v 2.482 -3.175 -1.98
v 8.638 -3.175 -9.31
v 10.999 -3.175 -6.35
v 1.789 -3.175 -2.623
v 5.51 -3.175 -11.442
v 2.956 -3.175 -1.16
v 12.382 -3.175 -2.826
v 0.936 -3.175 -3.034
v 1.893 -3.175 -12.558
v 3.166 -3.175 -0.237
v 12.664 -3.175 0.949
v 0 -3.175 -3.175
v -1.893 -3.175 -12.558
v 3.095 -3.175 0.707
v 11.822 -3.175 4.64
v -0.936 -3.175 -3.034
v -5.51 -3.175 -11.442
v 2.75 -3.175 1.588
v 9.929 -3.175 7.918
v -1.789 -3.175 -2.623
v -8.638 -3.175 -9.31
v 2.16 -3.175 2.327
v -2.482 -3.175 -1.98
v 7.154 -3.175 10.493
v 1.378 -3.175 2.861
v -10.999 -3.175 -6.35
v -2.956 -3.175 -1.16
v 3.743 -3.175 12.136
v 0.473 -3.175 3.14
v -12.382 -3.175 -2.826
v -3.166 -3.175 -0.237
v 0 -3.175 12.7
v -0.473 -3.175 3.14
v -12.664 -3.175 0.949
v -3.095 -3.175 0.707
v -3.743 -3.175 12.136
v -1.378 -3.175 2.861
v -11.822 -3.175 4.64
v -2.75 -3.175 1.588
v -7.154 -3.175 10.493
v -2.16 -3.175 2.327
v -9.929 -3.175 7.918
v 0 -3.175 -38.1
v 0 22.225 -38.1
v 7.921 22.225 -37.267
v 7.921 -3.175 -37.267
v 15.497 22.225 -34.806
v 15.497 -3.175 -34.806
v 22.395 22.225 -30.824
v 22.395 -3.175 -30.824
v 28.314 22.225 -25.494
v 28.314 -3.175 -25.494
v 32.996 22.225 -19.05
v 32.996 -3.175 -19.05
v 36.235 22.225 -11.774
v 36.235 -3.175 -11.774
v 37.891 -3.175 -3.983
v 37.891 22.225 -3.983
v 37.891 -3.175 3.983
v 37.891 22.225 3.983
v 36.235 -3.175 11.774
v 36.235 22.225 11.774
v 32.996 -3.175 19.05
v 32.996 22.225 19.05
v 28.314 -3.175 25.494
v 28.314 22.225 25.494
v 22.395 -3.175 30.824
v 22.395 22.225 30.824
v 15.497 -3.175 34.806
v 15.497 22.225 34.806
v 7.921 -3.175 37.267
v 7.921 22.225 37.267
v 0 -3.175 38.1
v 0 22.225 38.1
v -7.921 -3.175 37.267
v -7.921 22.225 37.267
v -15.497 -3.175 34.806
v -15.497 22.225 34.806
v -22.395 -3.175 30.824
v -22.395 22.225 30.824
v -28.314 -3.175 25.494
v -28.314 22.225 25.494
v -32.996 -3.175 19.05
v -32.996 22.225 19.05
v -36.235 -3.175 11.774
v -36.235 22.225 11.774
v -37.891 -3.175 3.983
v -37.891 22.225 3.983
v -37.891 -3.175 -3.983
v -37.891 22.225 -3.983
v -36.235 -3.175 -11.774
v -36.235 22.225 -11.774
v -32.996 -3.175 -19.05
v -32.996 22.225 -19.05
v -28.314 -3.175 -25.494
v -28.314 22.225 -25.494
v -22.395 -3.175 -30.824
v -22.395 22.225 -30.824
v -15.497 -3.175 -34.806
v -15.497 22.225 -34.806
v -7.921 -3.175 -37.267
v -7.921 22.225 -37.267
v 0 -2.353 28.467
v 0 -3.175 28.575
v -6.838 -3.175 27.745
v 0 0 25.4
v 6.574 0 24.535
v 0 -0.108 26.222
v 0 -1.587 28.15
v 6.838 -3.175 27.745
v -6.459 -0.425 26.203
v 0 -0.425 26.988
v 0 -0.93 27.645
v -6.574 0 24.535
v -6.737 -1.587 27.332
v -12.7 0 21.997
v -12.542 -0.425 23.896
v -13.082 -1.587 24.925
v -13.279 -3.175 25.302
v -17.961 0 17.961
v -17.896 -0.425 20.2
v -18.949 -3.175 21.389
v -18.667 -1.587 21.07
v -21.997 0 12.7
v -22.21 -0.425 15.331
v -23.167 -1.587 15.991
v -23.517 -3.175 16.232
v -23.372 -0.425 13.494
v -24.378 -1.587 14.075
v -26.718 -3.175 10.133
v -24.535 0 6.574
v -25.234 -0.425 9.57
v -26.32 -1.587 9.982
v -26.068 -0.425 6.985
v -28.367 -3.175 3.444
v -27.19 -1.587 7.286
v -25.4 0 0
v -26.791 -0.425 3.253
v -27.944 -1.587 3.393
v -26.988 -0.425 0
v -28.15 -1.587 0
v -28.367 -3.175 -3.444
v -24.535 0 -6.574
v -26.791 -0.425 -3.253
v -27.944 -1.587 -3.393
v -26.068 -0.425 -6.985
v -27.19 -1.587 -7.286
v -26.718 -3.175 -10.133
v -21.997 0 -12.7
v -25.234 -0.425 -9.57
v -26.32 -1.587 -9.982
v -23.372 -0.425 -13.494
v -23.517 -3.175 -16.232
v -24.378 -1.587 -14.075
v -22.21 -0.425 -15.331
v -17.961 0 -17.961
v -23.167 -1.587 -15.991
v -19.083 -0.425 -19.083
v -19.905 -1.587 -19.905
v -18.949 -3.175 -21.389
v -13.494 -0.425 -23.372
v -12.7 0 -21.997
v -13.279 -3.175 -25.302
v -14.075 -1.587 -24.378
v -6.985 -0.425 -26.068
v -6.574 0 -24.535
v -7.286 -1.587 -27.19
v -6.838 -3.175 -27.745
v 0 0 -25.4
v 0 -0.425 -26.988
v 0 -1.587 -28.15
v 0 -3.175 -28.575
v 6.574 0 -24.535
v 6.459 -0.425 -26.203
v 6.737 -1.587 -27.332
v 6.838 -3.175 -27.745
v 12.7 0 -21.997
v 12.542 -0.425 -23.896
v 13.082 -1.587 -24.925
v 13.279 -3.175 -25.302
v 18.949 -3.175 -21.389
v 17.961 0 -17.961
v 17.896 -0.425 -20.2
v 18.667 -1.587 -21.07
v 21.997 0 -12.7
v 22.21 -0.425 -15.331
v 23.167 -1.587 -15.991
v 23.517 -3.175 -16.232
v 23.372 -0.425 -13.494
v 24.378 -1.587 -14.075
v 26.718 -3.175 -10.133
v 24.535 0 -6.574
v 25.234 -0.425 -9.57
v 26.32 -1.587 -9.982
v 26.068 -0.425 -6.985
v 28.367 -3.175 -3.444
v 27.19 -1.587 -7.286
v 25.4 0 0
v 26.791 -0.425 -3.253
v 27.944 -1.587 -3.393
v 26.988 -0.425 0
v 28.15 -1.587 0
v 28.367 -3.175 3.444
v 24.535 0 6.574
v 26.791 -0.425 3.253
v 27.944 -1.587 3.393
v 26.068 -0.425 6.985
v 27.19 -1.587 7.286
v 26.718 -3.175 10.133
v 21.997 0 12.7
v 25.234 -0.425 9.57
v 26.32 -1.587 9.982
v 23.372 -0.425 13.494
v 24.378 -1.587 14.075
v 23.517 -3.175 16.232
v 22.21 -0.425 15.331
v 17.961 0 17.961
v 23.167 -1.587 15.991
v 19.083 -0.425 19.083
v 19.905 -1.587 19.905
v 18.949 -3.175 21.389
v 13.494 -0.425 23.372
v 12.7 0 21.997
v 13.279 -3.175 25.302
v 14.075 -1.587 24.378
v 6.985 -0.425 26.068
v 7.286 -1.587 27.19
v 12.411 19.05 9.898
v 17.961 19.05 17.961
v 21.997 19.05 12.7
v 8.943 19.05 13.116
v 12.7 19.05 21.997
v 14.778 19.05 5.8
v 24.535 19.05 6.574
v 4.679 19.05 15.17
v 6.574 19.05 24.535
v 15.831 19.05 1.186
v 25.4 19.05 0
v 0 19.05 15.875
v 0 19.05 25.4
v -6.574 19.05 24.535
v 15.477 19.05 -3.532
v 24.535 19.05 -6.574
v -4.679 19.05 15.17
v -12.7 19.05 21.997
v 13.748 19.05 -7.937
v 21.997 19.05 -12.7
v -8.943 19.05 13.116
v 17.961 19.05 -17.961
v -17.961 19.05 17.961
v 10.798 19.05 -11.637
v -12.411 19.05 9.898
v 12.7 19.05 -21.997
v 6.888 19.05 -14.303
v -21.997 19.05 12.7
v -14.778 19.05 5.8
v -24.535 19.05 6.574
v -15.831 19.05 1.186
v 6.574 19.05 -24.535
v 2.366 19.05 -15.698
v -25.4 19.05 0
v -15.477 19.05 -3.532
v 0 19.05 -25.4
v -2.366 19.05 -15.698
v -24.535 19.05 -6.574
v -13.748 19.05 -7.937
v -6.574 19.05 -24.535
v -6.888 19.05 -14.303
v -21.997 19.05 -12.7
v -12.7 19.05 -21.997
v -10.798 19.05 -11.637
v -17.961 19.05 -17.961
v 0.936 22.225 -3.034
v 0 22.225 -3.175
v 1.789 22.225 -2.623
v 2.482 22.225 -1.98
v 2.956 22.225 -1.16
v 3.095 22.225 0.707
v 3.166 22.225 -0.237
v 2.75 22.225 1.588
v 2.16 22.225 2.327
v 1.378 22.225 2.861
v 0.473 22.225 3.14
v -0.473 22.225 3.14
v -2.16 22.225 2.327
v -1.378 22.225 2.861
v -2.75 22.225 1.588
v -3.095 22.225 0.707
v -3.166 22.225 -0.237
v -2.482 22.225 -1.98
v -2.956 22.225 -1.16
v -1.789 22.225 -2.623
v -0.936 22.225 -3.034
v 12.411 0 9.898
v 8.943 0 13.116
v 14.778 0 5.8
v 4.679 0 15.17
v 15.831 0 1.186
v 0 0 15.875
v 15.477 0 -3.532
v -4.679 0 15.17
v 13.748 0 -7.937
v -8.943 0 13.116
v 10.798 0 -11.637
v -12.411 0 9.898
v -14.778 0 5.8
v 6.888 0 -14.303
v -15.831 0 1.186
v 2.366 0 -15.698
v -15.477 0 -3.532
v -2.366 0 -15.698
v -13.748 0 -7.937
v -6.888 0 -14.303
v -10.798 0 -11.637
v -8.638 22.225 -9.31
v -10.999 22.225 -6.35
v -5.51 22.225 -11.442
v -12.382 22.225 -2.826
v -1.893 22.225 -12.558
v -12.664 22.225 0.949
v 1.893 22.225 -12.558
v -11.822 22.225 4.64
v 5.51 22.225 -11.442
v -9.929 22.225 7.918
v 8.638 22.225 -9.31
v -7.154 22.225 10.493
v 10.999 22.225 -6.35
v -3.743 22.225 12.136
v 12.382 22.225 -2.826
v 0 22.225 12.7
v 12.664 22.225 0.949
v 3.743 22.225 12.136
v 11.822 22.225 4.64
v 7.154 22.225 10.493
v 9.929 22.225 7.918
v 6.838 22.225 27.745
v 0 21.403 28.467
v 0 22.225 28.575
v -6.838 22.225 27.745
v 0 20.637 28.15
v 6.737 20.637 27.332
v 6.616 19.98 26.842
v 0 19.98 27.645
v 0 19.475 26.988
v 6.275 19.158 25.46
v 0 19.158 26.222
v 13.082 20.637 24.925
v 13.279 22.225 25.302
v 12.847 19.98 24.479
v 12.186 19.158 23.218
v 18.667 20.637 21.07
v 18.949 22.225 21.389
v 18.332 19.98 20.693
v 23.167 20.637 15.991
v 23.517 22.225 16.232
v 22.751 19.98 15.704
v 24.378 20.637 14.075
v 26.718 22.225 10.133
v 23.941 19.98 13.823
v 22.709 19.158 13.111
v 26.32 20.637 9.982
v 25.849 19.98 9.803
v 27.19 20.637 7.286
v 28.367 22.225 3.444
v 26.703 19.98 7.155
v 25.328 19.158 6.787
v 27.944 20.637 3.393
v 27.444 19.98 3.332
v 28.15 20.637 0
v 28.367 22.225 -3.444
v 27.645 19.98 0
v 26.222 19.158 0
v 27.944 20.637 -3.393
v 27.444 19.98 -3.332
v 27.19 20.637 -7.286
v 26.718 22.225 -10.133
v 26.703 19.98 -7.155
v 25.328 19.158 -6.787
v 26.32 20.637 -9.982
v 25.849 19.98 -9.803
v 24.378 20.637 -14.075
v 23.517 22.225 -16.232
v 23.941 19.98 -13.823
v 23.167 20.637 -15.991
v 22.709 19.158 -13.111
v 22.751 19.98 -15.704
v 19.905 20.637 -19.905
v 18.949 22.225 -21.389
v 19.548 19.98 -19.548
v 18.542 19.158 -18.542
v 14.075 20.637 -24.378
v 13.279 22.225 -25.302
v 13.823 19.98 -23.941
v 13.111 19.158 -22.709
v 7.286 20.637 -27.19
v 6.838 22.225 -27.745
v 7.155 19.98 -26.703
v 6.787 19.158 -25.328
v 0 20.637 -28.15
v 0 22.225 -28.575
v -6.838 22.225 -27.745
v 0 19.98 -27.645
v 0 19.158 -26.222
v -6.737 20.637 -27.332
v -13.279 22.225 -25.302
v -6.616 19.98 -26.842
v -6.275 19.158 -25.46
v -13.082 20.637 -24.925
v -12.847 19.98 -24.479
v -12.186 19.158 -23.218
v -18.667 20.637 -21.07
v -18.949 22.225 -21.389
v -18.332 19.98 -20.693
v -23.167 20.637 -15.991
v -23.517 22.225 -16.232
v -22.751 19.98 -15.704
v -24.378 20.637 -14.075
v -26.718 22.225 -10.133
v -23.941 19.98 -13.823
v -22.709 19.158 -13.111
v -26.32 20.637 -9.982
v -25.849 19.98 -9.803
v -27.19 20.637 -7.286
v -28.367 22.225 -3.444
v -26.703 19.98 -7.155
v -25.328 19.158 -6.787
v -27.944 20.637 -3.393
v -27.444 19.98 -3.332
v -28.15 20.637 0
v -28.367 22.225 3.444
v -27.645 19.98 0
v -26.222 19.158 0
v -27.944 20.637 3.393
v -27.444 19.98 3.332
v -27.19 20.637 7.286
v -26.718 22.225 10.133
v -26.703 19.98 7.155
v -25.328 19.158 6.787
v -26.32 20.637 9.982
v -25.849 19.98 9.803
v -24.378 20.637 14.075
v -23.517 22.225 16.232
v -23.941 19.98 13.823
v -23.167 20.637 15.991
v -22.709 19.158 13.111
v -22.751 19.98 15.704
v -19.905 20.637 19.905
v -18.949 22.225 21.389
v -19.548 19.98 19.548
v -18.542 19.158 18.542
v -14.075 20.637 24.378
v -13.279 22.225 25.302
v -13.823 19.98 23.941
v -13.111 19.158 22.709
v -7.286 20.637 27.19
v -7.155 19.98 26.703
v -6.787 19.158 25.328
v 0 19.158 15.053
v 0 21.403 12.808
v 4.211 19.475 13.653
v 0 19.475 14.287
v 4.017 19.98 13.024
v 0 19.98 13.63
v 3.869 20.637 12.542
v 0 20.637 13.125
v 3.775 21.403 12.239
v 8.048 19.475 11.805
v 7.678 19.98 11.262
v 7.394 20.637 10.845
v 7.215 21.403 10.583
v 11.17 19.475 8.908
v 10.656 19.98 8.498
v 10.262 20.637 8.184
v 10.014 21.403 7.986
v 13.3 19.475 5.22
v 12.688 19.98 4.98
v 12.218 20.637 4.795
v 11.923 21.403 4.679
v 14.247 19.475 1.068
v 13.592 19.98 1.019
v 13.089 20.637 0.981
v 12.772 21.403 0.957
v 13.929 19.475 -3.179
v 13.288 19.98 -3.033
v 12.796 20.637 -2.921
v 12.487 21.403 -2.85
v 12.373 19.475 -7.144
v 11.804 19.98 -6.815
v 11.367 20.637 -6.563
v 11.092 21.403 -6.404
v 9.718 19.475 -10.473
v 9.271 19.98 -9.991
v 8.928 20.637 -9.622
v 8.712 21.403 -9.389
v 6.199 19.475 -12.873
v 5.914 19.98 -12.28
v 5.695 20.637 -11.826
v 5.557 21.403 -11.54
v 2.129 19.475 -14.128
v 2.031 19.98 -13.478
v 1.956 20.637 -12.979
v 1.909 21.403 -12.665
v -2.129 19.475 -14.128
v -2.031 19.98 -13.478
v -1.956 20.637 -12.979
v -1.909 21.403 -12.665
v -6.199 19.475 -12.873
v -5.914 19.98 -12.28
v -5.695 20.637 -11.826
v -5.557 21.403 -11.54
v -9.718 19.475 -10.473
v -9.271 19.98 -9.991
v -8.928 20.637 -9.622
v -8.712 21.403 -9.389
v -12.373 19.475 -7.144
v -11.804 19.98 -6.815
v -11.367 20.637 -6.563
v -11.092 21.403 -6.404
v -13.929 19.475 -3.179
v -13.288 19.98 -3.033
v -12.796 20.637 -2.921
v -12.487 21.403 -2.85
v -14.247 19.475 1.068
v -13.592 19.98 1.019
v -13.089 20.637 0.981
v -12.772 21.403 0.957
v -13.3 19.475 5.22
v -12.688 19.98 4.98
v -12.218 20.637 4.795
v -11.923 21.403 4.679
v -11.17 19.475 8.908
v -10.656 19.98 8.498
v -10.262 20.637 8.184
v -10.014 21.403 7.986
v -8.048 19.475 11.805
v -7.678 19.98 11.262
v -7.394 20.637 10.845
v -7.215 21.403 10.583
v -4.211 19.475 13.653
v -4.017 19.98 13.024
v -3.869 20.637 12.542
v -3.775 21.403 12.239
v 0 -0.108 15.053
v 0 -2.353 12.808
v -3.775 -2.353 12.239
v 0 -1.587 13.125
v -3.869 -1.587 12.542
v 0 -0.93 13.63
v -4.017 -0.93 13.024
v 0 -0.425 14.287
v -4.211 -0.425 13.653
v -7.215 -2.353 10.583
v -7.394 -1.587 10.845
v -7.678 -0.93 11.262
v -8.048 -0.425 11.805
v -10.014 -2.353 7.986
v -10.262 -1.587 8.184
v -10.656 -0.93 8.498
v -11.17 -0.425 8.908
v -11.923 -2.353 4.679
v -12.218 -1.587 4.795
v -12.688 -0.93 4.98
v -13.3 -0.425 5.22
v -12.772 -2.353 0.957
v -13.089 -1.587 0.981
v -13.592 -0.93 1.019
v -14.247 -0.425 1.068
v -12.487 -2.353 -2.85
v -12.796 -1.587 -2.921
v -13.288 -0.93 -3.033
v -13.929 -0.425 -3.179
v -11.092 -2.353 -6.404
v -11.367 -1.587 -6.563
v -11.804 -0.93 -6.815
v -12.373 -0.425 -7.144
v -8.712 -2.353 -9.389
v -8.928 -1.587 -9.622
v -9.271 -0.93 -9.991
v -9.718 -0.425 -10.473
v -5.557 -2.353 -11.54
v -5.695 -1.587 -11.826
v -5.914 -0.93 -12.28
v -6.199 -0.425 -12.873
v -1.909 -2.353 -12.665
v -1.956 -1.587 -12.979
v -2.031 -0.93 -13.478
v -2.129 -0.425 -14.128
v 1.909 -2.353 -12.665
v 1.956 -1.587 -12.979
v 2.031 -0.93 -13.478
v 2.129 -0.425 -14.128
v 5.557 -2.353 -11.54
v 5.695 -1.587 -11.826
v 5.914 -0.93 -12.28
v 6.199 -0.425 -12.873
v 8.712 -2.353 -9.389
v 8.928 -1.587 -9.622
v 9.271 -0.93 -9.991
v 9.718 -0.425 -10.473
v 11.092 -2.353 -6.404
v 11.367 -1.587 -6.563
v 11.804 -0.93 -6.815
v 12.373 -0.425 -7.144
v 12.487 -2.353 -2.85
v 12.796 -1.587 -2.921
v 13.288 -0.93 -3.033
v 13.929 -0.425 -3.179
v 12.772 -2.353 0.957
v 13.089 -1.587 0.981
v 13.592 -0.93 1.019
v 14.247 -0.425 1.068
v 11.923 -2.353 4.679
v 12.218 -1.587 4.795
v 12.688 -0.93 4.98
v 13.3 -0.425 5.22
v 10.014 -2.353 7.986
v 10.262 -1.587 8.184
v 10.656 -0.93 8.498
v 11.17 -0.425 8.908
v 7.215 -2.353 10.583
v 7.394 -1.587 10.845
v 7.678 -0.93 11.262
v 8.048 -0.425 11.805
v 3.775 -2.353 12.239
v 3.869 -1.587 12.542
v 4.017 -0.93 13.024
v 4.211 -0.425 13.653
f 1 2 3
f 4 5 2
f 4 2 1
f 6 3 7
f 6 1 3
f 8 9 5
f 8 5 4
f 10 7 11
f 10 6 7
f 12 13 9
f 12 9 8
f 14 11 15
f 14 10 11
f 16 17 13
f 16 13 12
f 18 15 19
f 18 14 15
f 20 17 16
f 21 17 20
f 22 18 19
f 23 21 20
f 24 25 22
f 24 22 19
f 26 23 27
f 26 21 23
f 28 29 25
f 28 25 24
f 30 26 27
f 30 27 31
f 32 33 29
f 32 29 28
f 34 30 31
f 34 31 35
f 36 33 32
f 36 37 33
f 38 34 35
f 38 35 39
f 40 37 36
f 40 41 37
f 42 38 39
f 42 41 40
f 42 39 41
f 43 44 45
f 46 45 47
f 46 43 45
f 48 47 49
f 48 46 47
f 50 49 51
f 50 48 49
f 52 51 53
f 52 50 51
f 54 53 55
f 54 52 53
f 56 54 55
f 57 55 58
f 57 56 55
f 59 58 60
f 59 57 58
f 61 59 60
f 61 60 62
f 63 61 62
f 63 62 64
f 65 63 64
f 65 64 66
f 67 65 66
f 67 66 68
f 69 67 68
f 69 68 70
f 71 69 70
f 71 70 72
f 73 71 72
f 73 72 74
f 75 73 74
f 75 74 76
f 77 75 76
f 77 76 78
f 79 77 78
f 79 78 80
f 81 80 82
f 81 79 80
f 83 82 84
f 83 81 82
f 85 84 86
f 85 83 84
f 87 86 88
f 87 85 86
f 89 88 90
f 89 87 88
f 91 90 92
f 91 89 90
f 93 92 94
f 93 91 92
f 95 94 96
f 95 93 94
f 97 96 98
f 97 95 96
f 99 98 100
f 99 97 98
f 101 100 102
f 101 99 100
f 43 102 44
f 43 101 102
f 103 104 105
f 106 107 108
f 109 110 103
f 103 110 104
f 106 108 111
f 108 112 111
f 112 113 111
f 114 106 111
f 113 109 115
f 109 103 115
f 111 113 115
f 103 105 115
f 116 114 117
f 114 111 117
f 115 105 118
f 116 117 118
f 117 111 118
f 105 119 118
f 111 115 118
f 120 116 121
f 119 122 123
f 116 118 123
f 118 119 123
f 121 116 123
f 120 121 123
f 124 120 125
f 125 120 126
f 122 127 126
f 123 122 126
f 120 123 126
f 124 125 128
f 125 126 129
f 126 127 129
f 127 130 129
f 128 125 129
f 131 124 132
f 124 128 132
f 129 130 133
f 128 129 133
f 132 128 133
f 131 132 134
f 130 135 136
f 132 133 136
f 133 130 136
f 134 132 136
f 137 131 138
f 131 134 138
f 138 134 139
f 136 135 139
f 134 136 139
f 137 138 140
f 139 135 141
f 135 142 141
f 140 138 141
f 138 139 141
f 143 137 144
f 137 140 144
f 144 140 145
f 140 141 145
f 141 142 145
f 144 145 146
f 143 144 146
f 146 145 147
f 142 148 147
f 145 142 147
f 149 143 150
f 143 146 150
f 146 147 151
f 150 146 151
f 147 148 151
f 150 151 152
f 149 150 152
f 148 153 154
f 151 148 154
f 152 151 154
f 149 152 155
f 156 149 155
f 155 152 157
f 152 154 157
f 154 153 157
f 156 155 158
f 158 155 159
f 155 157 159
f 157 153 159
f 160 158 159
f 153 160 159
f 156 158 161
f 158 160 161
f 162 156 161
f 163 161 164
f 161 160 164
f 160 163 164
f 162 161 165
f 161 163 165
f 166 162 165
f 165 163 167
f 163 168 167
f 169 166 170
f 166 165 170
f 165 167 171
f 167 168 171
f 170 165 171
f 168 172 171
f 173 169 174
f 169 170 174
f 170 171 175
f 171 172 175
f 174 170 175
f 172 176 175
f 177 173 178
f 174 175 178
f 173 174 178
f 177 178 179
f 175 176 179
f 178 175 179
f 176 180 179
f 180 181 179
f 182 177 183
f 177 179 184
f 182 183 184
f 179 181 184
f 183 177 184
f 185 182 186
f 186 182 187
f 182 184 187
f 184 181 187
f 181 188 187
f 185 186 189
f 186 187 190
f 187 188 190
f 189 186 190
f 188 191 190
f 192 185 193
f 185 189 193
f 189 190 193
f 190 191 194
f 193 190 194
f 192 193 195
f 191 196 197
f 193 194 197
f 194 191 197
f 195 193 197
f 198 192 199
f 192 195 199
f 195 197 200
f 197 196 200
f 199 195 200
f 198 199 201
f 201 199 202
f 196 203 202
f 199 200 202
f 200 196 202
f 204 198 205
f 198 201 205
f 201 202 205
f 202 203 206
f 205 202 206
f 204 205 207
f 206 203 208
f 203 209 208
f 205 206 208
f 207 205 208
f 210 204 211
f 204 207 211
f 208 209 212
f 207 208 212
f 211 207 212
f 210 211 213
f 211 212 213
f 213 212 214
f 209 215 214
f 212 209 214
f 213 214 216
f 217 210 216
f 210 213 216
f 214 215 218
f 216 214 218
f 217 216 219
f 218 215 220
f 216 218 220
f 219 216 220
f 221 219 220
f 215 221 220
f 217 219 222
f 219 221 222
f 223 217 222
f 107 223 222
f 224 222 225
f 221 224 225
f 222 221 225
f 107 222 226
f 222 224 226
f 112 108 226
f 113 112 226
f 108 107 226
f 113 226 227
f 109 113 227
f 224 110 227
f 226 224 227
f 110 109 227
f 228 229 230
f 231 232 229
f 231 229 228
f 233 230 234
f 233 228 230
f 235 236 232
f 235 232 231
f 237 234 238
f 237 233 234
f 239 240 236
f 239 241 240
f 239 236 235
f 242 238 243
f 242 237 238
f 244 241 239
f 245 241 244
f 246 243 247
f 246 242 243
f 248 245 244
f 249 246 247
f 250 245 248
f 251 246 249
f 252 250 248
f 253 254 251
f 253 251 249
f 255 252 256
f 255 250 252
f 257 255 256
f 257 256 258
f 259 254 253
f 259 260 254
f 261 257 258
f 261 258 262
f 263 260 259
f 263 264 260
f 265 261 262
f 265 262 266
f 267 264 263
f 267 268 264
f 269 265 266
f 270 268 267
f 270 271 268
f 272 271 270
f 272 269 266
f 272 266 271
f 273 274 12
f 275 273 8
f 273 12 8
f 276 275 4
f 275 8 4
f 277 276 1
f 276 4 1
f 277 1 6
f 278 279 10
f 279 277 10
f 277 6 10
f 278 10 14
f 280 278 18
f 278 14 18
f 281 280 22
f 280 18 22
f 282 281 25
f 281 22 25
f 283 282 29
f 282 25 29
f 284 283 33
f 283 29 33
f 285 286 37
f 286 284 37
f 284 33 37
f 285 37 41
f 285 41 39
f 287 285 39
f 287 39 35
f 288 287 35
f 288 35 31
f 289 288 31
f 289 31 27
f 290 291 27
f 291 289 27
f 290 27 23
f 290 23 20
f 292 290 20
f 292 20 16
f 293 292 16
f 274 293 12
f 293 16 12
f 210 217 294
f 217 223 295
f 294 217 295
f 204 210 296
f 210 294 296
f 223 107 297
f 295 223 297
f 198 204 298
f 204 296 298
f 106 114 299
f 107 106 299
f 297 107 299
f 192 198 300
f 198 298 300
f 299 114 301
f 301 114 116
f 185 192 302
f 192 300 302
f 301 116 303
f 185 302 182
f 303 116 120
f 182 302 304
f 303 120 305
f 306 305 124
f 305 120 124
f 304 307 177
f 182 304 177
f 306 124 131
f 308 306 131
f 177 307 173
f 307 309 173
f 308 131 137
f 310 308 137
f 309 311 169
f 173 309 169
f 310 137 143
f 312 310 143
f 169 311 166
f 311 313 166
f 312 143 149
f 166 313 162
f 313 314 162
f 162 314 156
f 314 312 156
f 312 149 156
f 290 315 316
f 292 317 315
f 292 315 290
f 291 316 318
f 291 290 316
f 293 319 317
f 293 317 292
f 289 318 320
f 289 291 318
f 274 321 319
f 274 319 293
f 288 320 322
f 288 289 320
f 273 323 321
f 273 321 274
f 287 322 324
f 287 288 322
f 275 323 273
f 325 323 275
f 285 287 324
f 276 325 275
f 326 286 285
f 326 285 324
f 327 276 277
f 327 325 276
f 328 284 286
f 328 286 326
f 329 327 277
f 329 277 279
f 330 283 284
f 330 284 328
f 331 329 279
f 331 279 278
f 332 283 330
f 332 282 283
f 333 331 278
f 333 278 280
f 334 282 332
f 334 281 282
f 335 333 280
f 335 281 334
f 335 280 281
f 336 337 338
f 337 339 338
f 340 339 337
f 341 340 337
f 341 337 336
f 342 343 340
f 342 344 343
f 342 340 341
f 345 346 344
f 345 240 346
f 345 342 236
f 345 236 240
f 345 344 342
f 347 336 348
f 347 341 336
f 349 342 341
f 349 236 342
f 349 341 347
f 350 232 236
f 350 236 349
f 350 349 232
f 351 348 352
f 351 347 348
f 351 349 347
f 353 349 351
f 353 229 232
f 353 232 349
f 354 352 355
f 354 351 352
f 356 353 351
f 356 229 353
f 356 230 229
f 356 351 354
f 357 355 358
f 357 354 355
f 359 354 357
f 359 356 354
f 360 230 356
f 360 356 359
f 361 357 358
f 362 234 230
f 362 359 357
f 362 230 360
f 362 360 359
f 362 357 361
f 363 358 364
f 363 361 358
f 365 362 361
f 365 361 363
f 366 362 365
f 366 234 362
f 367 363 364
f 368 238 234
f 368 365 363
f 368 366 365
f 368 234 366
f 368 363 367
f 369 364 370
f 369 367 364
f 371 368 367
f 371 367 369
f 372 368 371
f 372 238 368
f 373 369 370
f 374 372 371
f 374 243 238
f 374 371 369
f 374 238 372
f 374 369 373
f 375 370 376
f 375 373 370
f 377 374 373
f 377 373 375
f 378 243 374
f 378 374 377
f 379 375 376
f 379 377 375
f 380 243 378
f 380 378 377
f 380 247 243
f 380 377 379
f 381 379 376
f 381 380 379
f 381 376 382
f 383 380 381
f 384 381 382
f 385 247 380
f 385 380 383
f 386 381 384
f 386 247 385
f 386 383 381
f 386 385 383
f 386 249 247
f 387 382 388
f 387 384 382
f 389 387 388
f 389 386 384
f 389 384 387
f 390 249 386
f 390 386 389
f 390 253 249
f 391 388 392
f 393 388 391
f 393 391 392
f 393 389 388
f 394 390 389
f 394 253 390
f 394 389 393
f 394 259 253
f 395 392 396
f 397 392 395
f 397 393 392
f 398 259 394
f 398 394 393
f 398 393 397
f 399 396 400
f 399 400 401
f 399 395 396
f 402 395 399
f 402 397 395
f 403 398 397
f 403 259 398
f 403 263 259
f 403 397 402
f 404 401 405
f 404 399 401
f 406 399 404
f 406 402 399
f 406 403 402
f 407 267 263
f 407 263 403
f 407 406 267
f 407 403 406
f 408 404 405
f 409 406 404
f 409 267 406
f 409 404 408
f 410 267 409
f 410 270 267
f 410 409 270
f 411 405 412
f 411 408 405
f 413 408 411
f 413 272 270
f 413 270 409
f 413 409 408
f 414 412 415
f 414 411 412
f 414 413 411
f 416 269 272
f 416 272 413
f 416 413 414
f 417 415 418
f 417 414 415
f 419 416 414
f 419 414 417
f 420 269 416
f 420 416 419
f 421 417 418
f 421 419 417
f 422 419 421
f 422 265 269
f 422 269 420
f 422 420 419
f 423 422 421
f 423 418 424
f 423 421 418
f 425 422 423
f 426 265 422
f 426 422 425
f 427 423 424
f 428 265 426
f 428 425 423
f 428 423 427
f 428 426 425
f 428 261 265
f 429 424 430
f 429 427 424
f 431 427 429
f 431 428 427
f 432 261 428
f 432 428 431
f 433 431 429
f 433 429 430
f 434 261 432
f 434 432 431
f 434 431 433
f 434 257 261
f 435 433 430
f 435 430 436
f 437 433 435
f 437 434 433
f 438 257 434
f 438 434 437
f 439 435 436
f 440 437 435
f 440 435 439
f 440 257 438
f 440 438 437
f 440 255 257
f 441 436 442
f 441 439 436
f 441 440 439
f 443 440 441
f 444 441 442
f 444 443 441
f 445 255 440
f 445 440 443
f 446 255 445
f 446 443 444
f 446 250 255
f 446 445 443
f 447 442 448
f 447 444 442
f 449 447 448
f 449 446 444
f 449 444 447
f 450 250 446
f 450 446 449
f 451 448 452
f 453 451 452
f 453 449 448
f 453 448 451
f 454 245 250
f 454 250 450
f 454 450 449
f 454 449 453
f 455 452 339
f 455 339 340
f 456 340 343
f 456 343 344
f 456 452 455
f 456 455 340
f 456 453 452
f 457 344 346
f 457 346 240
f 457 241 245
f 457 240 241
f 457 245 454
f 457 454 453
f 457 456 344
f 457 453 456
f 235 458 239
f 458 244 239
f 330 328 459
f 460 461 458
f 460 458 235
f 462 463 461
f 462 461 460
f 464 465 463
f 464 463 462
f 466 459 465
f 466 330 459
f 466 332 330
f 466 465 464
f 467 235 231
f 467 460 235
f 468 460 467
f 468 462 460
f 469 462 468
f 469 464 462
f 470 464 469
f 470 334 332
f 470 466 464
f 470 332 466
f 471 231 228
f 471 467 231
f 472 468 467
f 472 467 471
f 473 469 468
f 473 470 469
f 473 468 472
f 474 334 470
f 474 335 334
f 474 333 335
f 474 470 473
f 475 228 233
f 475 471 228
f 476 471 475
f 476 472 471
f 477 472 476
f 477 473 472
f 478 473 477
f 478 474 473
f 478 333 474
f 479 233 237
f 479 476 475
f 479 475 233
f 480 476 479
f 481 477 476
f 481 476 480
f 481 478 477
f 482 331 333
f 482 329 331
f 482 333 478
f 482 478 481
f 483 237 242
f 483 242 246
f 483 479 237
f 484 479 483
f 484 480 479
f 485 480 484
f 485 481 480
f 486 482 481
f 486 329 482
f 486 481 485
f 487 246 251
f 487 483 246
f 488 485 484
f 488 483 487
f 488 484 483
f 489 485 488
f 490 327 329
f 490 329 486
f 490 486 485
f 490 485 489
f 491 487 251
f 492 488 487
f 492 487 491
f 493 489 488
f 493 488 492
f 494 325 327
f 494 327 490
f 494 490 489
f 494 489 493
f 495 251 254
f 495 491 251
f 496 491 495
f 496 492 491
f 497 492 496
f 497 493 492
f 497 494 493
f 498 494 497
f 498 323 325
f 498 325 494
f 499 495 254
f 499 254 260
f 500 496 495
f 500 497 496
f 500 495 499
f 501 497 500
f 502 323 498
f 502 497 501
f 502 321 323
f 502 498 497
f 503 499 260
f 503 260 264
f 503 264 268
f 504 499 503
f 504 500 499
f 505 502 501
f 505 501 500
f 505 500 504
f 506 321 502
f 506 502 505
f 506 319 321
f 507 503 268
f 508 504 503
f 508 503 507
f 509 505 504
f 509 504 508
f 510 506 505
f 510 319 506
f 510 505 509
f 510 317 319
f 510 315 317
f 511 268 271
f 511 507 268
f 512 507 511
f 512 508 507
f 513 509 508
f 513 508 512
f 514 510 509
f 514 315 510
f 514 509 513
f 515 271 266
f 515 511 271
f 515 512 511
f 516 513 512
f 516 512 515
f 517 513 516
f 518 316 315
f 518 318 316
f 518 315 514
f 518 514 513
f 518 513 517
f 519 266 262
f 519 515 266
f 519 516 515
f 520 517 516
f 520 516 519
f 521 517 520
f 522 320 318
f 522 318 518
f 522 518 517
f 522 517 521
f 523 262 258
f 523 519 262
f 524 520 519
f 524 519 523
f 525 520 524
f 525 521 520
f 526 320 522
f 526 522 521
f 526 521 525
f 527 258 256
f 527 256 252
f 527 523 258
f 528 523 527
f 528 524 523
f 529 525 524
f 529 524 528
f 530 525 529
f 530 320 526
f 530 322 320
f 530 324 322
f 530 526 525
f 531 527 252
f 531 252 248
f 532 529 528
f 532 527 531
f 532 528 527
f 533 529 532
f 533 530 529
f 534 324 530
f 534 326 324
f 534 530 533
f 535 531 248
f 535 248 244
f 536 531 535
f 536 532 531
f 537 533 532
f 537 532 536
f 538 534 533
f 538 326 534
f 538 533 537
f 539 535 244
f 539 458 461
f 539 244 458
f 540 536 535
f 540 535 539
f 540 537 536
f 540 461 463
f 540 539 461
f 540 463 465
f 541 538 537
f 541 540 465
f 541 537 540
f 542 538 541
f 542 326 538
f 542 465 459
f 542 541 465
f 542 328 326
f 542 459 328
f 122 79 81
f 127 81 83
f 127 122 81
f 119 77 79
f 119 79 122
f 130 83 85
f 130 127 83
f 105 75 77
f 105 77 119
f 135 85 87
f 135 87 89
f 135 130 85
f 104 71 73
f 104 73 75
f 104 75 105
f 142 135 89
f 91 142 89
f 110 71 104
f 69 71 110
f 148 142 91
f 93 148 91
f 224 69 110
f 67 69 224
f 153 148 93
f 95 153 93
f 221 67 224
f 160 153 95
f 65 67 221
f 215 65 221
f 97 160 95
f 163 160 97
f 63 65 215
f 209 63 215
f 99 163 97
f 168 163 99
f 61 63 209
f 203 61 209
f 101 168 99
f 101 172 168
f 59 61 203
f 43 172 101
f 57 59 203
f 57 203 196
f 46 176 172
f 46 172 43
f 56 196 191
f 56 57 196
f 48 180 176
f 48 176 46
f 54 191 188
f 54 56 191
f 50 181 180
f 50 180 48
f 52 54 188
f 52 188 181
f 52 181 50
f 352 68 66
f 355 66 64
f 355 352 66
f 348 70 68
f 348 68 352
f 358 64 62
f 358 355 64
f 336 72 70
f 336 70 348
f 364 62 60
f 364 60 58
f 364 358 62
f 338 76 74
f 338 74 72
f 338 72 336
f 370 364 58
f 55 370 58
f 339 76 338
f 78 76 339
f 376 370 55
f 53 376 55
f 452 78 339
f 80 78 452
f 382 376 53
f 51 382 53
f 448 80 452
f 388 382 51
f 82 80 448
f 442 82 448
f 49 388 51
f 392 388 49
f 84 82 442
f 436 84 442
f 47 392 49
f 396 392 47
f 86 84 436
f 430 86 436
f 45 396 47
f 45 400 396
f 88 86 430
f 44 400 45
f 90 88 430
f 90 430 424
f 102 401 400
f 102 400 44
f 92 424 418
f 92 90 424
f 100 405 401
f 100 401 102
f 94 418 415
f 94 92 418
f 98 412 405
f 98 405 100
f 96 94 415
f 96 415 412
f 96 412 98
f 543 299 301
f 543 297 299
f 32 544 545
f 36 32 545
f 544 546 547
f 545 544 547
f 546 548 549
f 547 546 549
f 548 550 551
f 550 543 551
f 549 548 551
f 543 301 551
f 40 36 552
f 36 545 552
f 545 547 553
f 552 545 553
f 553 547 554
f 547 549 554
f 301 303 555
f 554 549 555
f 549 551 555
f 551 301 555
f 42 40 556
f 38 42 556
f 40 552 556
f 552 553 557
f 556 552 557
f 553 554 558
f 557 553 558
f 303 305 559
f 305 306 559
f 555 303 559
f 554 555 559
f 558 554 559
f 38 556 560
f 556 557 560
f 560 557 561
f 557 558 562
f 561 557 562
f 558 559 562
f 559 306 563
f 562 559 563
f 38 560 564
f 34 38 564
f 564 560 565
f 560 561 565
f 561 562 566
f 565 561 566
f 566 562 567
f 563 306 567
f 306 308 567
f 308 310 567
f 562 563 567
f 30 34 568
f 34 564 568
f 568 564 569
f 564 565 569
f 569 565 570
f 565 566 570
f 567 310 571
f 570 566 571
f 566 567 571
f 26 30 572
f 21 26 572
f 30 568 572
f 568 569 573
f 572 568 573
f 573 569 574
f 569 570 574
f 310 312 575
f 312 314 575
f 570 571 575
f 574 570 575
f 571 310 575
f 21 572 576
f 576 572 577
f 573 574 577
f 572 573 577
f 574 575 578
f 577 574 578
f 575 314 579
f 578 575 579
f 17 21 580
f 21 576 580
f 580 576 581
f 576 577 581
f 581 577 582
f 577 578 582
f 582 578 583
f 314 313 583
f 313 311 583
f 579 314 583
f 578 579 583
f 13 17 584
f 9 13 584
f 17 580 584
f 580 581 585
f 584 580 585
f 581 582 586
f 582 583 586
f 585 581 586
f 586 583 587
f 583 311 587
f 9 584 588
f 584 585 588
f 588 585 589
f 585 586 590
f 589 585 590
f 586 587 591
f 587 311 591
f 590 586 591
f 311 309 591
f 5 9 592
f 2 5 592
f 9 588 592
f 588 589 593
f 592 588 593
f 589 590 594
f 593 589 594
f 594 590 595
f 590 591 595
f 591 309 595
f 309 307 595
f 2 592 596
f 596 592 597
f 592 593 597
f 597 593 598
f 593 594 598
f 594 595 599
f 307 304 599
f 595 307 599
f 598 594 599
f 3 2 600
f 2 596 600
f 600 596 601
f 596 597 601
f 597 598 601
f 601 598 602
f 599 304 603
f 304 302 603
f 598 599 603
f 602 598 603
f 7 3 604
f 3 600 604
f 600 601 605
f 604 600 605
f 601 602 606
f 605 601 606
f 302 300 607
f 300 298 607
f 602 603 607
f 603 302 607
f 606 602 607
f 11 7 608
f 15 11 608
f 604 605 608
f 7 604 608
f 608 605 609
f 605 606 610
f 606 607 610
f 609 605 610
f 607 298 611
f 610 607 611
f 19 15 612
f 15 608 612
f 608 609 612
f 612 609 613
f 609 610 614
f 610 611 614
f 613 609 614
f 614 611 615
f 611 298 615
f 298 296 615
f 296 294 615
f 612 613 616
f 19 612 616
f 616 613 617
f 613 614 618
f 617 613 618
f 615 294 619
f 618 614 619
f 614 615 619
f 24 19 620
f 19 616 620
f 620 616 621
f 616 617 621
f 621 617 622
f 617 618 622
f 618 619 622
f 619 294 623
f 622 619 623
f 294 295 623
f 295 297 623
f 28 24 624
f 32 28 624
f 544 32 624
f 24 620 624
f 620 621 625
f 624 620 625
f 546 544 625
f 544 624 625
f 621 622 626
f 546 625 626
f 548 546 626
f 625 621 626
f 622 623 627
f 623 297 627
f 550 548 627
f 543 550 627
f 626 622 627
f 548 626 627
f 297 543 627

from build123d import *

# Parameters (mm, degrees)
SKETCH1_R           = 38.1
SKETCH1_R_2         = 3.175
BOSS_EXTRUDE1_DEPTH = 19.05
SKETCH2_R           = 38.1
SKETCH2_R_2         = 28.575
BOSS_EXTRUDE2_DEPTH = 3.175
BOSS_EXTRUDE3_START = 3.175
SKETCH3_R           = 38.1
SKETCH3_R_2         = 28.575
BOSS_EXTRUDE3_DEPTH = 3.175
SKETCH4_R           = 12.7
SKETCH4_R_2         = 3.175
BOSS_EXTRUDE4_DEPTH = 3.175
BOSS_EXTRUDE5_START = 3.175
SKETCH5_R           = 12.7
SKETCH5_R_2         = 3.175
BOSS_EXTRUDE5_DEPTH = 3.175
FILLET1_R           = 3.175


with BuildPart() as part:
    # Sketch1 → Boss-Extrude1 (new body)
    with BuildSketch(Plane(origin=(0, 0, 0), x_dir=(1, 0, 0), z_dir=(0, 1, 0))):
        with Locations(Location((0, 0, 0), (0, 0, 90))):
            Circle(SKETCH1_R)
        with Locations(Location((0, 0, 0), (0, 0, 90))):
            Circle(SKETCH1_R_2, mode=Mode.SUBTRACT)
    extrude(amount=BOSS_EXTRUDE1_DEPTH)

    # Sketch2 → Boss-Extrude2 (add)
    with BuildSketch(Plane(origin=(0, 19.05, 0), x_dir=(1, 0, 0), z_dir=(0, 1, 0))):
        with Locations(Location((0, 0, 0), (0, 0, 90))):
            Circle(SKETCH2_R)
        with Locations(Location((0, 0, 0), (0, 0, 270))):
            Circle(SKETCH2_R_2, mode=Mode.SUBTRACT)
    extrude(amount=BOSS_EXTRUDE2_DEPTH)

    # Sketch3 → Boss-Extrude3 (add)
    with BuildSketch(Plane.XZ.offset(BOSS_EXTRUDE3_START)):
        with Locations(Location((0, 0, 0), (0, 0, 270))):
            Circle(SKETCH3_R)
        with Locations(Location((0, 0, 0), (0, 0, 90))):
            Circle(SKETCH3_R_2, mode=Mode.SUBTRACT)
    extrude(amount=-BOSS_EXTRUDE3_DEPTH)

    # Sketch4 → Boss-Extrude4 (add)
    with BuildSketch(Plane(origin=(0, 19.05, 0), x_dir=(1, 0, 0), z_dir=(0, 1, 0))):
        with Locations(Location((0, 0, 0), (0, 0, 270))):
            Circle(SKETCH4_R)
        with Locations(Location((0, 0, 0), (0, 0, 90))):
            Circle(SKETCH4_R_2, mode=Mode.SUBTRACT)
    extrude(amount=BOSS_EXTRUDE4_DEPTH)

    # Sketch5 → Boss-Extrude5 (add)
    with BuildSketch(Plane.XZ.offset(BOSS_EXTRUDE5_START)):
        with Locations(Location((0, 0, 0), (0, 0, 90))):
            Circle(SKETCH5_R)
        with Locations(Location((0, 0, 0), (0, 0, 270))):
            Circle(SKETCH5_R_2, mode=Mode.SUBTRACT)
    extrude(amount=-BOSS_EXTRUDE5_DEPTH)

    # Fillet1
    fillet1_edges = [part.edges().sort_by_distance(p)[0] for p in [
        (0, 0, -28.575),
        (0, 19.05, -12.7),
        (0, 0, -12.7),
        (0, 19.05, -28.575),
    ]]
    fillet(fillet1_edges, radius=FILLET1_R - 0.0001)  # a hair under: the kernel refuses the full size


solid = part.part
